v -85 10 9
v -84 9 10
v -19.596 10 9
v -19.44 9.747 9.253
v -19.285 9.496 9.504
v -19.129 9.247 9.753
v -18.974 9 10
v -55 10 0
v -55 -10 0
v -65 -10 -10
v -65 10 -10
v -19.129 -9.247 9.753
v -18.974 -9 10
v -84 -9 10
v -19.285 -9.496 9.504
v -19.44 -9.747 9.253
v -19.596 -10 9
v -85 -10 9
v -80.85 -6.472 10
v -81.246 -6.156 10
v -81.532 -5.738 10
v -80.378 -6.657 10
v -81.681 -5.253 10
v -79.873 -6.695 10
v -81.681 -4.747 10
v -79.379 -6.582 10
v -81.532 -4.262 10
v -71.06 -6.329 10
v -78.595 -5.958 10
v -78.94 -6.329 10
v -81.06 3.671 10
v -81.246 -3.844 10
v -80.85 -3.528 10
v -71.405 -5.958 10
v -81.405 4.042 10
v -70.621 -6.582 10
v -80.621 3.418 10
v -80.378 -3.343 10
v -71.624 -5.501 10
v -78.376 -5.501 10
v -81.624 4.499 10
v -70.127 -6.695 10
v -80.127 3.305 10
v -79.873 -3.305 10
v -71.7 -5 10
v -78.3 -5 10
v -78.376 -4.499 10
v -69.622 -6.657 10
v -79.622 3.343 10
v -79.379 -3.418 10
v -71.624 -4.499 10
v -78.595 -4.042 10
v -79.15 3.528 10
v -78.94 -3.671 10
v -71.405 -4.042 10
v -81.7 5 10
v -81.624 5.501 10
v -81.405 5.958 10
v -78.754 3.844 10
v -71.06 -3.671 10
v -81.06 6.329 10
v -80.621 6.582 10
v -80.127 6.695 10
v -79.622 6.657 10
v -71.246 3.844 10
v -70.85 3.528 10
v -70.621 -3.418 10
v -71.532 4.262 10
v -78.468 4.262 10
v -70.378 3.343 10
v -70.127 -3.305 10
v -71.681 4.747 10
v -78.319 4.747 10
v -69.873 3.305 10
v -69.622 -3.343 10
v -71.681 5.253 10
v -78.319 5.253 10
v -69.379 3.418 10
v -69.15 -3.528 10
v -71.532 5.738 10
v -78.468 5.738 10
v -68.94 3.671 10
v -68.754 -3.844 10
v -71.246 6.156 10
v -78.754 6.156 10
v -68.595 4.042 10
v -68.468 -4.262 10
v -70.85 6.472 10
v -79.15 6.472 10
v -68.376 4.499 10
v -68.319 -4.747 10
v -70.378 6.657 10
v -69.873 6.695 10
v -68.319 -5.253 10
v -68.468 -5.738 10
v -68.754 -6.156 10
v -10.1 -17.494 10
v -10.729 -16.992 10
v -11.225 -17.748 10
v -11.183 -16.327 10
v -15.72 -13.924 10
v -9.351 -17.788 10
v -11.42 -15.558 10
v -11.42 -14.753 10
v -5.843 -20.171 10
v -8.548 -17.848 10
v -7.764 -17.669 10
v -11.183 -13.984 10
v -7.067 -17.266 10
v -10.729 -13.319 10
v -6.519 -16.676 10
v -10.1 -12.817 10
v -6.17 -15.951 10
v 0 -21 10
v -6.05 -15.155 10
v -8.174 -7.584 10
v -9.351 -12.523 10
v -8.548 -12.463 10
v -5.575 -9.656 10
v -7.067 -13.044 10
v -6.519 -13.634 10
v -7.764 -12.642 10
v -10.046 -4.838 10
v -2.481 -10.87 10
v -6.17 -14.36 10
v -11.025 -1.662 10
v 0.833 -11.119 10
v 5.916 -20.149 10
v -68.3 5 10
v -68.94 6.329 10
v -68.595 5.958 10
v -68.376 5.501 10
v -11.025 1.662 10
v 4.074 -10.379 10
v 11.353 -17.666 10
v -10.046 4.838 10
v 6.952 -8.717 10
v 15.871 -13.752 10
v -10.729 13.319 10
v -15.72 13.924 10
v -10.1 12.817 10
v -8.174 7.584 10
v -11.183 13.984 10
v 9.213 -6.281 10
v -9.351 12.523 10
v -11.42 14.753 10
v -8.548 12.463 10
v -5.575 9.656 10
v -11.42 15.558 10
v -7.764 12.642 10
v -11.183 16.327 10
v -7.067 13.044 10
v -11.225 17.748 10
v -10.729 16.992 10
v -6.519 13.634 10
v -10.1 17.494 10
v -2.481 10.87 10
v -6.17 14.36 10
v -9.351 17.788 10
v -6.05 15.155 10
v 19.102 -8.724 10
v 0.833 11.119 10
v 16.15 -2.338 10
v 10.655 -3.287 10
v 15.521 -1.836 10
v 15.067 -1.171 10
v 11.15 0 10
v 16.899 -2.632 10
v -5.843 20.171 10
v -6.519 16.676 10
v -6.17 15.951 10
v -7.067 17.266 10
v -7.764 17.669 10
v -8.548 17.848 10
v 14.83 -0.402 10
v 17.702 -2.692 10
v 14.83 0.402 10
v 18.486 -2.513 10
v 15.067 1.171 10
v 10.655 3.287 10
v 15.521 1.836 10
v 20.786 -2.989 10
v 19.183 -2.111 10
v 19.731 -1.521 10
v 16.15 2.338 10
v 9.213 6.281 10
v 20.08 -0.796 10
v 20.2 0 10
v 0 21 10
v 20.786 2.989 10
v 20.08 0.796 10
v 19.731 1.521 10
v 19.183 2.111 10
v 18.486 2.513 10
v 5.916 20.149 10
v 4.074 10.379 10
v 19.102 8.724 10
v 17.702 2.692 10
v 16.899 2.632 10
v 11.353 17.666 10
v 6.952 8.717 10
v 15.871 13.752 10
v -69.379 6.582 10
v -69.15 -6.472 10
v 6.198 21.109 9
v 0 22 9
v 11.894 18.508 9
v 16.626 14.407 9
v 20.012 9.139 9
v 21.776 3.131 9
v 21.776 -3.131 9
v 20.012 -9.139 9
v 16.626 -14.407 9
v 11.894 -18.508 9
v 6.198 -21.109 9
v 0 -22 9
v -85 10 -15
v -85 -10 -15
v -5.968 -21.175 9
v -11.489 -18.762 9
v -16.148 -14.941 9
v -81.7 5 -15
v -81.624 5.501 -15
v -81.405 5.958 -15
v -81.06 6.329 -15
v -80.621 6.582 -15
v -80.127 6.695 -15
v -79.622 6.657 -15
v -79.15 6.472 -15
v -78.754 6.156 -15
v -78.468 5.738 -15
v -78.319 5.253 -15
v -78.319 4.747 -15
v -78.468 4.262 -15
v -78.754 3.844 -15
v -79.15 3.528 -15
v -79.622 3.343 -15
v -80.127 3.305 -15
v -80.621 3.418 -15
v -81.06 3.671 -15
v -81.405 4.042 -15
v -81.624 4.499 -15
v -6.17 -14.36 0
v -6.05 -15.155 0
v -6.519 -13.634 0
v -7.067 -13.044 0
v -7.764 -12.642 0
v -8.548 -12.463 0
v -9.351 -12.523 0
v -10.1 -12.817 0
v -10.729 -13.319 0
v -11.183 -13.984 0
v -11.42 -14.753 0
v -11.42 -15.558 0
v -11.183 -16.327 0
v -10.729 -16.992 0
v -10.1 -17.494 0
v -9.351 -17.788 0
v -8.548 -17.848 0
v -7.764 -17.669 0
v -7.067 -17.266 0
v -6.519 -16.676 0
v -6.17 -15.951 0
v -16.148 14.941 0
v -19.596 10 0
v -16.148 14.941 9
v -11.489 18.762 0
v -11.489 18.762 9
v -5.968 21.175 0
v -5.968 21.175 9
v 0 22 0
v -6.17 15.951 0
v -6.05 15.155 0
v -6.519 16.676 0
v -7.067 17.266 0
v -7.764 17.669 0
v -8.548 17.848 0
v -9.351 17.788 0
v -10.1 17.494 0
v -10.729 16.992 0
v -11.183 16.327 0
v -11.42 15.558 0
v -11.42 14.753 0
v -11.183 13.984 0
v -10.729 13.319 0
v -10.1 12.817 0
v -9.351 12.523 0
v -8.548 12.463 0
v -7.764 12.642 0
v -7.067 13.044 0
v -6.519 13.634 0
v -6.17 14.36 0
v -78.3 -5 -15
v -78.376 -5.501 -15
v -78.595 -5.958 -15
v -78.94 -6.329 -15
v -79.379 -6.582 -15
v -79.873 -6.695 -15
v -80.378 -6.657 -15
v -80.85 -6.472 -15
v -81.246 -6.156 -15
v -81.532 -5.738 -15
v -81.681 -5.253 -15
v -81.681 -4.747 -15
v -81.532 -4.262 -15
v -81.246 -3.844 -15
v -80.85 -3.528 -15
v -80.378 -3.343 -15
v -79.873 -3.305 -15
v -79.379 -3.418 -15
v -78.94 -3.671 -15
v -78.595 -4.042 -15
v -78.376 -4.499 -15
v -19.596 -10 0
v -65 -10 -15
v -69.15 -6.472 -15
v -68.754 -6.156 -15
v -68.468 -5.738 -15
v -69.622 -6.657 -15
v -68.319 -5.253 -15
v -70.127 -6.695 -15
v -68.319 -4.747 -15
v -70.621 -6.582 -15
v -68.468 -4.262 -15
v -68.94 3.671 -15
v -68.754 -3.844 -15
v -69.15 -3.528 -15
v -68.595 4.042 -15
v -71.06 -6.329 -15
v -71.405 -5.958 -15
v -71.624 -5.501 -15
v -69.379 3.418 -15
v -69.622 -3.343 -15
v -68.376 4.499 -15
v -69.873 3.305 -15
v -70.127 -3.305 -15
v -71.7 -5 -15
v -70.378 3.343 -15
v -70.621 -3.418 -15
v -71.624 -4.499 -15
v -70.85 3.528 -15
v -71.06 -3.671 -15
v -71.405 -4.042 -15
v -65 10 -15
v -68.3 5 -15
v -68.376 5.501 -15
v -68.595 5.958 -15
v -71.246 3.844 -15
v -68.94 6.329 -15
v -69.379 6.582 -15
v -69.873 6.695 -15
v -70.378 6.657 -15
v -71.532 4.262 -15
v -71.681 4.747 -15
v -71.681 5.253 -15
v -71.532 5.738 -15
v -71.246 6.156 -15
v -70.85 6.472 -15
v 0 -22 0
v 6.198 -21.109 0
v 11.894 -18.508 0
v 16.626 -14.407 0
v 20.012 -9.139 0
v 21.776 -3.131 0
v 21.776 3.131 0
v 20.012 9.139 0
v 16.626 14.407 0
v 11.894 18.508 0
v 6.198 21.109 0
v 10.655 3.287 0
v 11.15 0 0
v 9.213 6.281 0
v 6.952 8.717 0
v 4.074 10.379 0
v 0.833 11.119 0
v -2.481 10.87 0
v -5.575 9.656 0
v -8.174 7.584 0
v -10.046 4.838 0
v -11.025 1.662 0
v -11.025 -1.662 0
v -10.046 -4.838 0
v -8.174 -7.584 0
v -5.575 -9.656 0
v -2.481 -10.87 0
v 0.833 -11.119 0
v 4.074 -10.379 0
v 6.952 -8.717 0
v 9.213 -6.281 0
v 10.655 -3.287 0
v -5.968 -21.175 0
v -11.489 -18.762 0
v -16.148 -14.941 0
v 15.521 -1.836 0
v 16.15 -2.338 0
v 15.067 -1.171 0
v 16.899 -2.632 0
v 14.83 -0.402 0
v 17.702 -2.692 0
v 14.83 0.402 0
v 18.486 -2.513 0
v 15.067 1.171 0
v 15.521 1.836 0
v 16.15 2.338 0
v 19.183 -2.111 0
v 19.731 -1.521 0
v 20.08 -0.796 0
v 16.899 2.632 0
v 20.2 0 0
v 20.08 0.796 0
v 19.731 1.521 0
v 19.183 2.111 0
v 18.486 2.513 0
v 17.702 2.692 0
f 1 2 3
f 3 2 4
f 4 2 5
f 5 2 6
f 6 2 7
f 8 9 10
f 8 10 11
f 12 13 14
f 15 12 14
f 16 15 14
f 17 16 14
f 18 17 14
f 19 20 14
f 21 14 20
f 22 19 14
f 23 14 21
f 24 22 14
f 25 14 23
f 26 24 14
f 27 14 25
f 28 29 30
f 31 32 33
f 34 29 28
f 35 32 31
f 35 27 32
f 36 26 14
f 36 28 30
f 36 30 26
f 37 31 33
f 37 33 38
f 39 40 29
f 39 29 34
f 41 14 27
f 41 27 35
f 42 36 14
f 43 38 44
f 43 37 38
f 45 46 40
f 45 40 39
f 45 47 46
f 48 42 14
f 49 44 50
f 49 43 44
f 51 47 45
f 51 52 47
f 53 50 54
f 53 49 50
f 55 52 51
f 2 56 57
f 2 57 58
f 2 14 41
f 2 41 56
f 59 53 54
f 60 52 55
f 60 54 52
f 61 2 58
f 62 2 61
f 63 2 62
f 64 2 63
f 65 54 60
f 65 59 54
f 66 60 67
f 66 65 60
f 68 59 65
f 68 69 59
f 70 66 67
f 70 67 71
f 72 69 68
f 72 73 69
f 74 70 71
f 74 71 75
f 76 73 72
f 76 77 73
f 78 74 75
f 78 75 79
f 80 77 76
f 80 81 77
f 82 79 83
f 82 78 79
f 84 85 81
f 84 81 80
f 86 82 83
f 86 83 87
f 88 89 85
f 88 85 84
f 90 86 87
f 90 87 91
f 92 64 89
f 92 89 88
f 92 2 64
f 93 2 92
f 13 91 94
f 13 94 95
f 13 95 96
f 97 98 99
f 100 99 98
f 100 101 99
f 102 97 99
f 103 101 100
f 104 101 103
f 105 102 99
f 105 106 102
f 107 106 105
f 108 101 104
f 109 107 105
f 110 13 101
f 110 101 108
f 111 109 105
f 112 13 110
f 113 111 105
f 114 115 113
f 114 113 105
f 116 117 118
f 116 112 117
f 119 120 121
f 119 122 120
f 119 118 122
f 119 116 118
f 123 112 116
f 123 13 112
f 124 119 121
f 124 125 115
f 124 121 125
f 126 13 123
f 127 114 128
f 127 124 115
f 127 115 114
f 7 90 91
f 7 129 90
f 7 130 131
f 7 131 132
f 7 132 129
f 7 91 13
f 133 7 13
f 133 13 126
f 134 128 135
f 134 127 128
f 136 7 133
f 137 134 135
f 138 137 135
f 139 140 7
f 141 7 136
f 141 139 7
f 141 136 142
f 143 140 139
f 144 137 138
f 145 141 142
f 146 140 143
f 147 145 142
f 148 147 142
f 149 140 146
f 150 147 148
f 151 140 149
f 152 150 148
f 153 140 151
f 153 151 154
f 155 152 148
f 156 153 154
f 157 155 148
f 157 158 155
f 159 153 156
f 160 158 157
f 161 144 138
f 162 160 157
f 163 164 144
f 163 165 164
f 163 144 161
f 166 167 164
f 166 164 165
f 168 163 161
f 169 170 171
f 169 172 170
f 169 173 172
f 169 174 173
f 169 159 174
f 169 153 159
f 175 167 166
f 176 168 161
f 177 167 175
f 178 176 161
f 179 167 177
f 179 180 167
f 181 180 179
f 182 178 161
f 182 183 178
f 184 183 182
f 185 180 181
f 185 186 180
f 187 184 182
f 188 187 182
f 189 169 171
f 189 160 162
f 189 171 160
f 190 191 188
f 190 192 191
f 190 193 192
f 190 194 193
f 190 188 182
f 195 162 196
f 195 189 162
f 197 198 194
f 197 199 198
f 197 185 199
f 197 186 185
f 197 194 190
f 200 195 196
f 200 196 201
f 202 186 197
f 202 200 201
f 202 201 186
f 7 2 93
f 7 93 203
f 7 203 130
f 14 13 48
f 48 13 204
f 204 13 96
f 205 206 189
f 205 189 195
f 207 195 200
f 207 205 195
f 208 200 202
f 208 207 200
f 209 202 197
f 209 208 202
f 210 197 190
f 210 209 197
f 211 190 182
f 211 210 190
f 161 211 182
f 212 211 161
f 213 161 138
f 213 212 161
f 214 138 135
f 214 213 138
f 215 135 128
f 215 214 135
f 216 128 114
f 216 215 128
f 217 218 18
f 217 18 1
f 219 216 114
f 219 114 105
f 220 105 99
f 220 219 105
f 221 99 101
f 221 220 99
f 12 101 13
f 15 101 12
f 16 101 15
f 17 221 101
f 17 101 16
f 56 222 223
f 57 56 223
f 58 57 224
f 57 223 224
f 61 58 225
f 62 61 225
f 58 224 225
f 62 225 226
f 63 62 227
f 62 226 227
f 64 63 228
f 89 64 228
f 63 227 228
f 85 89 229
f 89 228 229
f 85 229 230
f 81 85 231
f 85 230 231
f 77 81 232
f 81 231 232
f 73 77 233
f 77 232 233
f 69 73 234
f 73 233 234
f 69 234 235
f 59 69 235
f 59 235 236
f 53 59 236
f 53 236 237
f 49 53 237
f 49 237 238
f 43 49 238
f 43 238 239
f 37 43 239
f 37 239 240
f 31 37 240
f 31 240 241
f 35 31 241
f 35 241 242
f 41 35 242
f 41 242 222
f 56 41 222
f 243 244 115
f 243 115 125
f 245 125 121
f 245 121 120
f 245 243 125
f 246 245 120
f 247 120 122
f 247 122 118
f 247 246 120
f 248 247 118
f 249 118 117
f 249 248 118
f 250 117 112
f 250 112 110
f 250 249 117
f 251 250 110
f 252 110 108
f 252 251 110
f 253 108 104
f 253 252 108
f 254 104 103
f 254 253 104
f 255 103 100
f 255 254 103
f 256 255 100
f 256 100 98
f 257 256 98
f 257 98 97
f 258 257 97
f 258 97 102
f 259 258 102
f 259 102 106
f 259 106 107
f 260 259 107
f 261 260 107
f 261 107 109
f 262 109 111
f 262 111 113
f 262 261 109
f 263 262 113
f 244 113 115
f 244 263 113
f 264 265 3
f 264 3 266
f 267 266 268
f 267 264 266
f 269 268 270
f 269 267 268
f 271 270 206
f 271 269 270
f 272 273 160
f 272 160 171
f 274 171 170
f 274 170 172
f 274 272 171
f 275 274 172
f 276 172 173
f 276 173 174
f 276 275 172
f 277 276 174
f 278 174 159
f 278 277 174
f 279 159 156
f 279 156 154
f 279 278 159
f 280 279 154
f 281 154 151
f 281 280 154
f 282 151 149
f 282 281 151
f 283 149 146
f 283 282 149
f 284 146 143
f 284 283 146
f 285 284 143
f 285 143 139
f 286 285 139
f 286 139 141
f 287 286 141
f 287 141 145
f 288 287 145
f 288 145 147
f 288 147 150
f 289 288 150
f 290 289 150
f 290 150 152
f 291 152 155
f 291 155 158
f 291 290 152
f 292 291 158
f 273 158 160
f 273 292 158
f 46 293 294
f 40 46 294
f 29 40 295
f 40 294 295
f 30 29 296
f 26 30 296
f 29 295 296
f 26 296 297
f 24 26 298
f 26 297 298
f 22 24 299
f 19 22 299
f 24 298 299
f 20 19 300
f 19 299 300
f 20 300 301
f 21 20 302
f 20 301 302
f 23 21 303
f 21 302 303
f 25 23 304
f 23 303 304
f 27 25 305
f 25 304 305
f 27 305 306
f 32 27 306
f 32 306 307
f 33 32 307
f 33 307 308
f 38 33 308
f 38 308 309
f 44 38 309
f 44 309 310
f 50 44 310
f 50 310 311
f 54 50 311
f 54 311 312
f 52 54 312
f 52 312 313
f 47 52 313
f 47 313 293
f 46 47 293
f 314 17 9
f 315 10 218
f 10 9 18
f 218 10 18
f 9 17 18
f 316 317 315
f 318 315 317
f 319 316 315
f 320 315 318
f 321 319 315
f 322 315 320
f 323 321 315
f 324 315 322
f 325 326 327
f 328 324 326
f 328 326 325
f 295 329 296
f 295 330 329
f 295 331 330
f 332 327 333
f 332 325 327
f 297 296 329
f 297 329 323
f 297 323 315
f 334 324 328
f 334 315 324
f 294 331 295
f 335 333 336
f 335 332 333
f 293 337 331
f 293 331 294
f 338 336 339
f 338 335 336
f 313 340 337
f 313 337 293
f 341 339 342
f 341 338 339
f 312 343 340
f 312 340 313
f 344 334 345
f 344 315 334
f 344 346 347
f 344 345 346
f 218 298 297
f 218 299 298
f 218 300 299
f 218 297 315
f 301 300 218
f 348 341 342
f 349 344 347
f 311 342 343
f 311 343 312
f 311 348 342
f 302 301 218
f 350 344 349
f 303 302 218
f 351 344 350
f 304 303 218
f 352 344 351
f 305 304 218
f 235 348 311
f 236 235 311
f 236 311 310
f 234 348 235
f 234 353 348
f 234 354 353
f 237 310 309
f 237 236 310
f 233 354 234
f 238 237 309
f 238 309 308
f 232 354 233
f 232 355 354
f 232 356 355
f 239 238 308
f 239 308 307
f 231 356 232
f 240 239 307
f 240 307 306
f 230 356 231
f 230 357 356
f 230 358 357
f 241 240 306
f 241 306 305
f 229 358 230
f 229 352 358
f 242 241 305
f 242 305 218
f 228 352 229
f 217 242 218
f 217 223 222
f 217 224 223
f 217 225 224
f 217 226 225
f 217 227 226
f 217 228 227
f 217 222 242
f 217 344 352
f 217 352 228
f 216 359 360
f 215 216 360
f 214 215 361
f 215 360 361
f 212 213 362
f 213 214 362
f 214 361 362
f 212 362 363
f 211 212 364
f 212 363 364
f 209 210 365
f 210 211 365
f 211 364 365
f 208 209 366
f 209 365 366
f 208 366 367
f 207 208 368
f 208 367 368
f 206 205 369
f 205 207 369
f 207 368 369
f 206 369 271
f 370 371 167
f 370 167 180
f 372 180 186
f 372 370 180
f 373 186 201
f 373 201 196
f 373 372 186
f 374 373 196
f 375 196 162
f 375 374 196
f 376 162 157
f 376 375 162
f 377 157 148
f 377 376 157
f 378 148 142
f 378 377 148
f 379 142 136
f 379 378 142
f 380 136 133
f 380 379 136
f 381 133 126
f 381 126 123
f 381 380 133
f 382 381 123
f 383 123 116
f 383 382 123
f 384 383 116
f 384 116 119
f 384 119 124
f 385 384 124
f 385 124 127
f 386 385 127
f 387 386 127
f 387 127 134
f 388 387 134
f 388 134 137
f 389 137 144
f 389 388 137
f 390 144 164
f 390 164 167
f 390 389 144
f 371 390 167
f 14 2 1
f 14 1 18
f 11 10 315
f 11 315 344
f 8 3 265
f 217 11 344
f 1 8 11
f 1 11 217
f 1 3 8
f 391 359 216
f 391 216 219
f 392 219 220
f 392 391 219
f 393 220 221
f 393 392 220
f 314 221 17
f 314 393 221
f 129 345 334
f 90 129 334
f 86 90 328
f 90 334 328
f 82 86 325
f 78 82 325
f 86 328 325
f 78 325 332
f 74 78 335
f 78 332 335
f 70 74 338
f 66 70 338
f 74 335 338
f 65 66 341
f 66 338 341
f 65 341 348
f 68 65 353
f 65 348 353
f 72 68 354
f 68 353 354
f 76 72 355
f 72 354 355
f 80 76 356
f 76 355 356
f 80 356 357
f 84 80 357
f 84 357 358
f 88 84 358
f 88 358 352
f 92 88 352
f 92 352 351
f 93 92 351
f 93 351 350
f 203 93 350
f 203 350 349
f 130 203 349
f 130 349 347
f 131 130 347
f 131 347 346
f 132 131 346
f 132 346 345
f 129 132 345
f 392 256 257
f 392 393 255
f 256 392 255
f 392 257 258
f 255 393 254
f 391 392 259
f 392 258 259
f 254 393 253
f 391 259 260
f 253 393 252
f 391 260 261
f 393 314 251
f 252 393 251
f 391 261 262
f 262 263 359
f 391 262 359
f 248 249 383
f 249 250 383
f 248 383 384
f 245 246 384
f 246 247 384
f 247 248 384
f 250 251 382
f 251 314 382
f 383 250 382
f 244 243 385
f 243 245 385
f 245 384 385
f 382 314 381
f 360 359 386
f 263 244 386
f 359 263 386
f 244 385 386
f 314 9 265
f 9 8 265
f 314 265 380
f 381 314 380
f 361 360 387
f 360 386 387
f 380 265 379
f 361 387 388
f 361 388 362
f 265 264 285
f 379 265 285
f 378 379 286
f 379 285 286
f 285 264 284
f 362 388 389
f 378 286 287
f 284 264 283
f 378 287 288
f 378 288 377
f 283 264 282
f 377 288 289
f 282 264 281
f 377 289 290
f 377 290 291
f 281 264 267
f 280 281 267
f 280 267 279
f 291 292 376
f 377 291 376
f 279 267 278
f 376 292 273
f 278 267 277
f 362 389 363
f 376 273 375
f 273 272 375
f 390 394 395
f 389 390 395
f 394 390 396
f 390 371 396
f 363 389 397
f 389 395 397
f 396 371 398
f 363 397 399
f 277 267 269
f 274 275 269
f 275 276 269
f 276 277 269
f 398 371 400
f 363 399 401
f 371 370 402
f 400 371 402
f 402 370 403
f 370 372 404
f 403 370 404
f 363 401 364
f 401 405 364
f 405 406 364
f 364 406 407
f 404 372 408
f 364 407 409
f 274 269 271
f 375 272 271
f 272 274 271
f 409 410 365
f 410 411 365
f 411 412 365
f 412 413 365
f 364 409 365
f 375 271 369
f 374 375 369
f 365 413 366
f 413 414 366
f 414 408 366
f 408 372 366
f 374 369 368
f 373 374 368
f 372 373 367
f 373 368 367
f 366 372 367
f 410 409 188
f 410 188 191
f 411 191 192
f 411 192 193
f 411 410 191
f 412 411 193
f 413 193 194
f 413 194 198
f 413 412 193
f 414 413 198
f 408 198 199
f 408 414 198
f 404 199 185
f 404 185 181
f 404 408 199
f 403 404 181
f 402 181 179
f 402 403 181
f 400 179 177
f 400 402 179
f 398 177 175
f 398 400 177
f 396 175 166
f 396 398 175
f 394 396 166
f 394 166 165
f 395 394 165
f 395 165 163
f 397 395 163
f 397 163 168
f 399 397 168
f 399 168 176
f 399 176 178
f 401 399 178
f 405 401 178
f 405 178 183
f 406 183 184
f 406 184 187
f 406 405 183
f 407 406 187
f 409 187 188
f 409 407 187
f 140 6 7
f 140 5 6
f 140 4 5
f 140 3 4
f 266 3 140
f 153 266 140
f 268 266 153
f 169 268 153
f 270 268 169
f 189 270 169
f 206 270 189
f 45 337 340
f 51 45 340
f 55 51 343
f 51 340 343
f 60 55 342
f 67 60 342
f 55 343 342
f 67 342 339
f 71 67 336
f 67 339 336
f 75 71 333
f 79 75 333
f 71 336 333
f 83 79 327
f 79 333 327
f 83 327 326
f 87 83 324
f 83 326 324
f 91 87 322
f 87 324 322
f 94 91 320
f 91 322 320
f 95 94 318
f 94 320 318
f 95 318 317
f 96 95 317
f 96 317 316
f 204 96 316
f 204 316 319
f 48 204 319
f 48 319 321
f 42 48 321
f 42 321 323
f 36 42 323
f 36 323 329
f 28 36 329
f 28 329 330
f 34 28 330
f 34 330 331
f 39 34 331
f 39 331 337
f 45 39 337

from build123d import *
from build123d.topology import SkipClean

# Parameters (mm, degrees)
SKETCH_1_R          = 22
SKETCH_1_R_2        = 11.15
SKETCH_1_R_3        = 2.7
EXTRUDE_1_DEPTH     = 10
EXTRUDE_START       = -10
EXTRUDE_2_DEPTH     = 10
CUT_EXTRUDE_START   = -10
CUT_EXTRUDE_1_DEPTH = 10
SKETCH_4_W          = 20
SKETCH_4_H          = 20
EXTRUDE_3_DEPTH     = 15
CHAMFER_2_SIZE      = 10
CHAMFER_4_SIZE      = 1
SKETCH_6_R          = 1.7
CUT_EXTRUDE_3_DEPTH = 92.290744328
CHAMFER_6_SIZE      = 1


with BuildPart() as part:
    # ｽｹｯﾁ1 → ﾎﾞｽ - 押し出し1 (new body)
    with BuildSketch(Plane.XY):
        Circle(SKETCH_1_R)
        Circle(SKETCH_1_R_2, mode=Mode.SUBTRACT)
        with Locations((-8.75, -15.155444566)):
            Circle(SKETCH_1_R_3, mode=Mode.SUBTRACT)
        with Locations((17.5, 0)):
            Circle(SKETCH_1_R_3, mode=Mode.SUBTRACT)
        with Locations((-8.75, 15.155444566)):
            Circle(SKETCH_1_R_3, mode=Mode.SUBTRACT)
    extrude(amount=EXTRUDE_1_DEPTH)

    # ｽｹｯﾁ2 → ﾎﾞｽ - 押し出し2 (add)
    with BuildSketch(Plane.XY.offset(10).offset(EXTRUDE_START)):
        with BuildLine():
            ThreePointArc((0, -22), (-22, 0), (0, 22))
            Line((0, 22), (-85, 22))
            Line((-85, 22), (-85, -22))
            Line((-85, -22), (0, -22))
        make_face()
    extrude(amount=EXTRUDE_2_DEPTH)

    # ｽｹｯﾁ3 → ｶｯﾄ - 押し出し1 (cut)
    with BuildSketch(Plane.XY.offset(10).offset(CUT_EXTRUDE_START)):
        with BuildLine():
            Line((-85, 22), (-85, 10))
            Line((-85, 10), (-19.595917942, 10))
            ThreePointArc((-19.595917942, 10), (-11.489125293, 18.761663039), (0, 22))
            Line((0, 22), (-85, 22))
        make_face()
        with BuildLine():
            Line((-19.595917942, -10), (-85, -10))
            Line((-85, -10), (-85, -22))
            Line((-85, -22), (0, -22))
            ThreePointArc((0, -22), (-11.489125293, -18.761663039), (-19.595917942, -10))
        make_face()
    extrude(amount=CUT_EXTRUDE_1_DEPTH, mode=Mode.SUBTRACT)

    # ｽｹｯﾁ4 → ﾎﾞｽ - 押し出し3 (add)
    with BuildSketch(Plane(origin=(0, 0, 0), x_dir=(-1, 0, 0), z_dir=(0, 0, -1))):
        with Locations((75, 0)):
            Rectangle(SKETCH_4_W, SKETCH_4_H)
    extrude(amount=EXTRUDE_3_DEPTH)

    # 面取り2
    chamfer_2_edges = [part.edges().sort_by_distance(p)[0] for p in [
        (-65, 0, 0),
    ]]
    chamfer(chamfer_2_edges, length=CHAMFER_2_SIZE)

    # 面取り4
    chamfer_4_edges = [part.edges().sort_by_distance(p)[0] for p in [
        (22, 0, 10),
        (-52.297958971, 10, 10),
        (-52.297958971, -10, 10),
    ]]
    chamfer(chamfer_4_edges, length=CHAMFER_4_SIZE)

    # ｽｹｯﾁ6 → ｶｯﾄ - 押し出し3 (cut, through all)
    with SkipClean():  # the faces are left unmerged after this step: merging them gives an invalid solid
        with BuildSketch(Plane(origin=(0, 0, -15), x_dir=(-1, 0, 0), z_dir=(0, 0, -1))):
            with Locations((80, 5)):
                Circle(SKETCH_6_R)
            with Locations(Location((70, 5, 0), (0, 0, 180))):
                Circle(SKETCH_6_R)
            with Locations((70, -5)):
                Circle(SKETCH_6_R)
            with Locations(Location((80, -5, 0), (0, 0, 180))):
                Circle(SKETCH_6_R)
        extrude(amount=-CUT_EXTRUDE_3_DEPTH, mode=Mode.SUBTRACT)

    # 面取り6
    chamfer_6_edges = [part.edges().sort_by_distance(p)[0] for p in [
        (-85, 0, 10),
    ]]
    chamfer(chamfer_6_edges, length=CHAMFER_6_SIZE)


solid = part.part
